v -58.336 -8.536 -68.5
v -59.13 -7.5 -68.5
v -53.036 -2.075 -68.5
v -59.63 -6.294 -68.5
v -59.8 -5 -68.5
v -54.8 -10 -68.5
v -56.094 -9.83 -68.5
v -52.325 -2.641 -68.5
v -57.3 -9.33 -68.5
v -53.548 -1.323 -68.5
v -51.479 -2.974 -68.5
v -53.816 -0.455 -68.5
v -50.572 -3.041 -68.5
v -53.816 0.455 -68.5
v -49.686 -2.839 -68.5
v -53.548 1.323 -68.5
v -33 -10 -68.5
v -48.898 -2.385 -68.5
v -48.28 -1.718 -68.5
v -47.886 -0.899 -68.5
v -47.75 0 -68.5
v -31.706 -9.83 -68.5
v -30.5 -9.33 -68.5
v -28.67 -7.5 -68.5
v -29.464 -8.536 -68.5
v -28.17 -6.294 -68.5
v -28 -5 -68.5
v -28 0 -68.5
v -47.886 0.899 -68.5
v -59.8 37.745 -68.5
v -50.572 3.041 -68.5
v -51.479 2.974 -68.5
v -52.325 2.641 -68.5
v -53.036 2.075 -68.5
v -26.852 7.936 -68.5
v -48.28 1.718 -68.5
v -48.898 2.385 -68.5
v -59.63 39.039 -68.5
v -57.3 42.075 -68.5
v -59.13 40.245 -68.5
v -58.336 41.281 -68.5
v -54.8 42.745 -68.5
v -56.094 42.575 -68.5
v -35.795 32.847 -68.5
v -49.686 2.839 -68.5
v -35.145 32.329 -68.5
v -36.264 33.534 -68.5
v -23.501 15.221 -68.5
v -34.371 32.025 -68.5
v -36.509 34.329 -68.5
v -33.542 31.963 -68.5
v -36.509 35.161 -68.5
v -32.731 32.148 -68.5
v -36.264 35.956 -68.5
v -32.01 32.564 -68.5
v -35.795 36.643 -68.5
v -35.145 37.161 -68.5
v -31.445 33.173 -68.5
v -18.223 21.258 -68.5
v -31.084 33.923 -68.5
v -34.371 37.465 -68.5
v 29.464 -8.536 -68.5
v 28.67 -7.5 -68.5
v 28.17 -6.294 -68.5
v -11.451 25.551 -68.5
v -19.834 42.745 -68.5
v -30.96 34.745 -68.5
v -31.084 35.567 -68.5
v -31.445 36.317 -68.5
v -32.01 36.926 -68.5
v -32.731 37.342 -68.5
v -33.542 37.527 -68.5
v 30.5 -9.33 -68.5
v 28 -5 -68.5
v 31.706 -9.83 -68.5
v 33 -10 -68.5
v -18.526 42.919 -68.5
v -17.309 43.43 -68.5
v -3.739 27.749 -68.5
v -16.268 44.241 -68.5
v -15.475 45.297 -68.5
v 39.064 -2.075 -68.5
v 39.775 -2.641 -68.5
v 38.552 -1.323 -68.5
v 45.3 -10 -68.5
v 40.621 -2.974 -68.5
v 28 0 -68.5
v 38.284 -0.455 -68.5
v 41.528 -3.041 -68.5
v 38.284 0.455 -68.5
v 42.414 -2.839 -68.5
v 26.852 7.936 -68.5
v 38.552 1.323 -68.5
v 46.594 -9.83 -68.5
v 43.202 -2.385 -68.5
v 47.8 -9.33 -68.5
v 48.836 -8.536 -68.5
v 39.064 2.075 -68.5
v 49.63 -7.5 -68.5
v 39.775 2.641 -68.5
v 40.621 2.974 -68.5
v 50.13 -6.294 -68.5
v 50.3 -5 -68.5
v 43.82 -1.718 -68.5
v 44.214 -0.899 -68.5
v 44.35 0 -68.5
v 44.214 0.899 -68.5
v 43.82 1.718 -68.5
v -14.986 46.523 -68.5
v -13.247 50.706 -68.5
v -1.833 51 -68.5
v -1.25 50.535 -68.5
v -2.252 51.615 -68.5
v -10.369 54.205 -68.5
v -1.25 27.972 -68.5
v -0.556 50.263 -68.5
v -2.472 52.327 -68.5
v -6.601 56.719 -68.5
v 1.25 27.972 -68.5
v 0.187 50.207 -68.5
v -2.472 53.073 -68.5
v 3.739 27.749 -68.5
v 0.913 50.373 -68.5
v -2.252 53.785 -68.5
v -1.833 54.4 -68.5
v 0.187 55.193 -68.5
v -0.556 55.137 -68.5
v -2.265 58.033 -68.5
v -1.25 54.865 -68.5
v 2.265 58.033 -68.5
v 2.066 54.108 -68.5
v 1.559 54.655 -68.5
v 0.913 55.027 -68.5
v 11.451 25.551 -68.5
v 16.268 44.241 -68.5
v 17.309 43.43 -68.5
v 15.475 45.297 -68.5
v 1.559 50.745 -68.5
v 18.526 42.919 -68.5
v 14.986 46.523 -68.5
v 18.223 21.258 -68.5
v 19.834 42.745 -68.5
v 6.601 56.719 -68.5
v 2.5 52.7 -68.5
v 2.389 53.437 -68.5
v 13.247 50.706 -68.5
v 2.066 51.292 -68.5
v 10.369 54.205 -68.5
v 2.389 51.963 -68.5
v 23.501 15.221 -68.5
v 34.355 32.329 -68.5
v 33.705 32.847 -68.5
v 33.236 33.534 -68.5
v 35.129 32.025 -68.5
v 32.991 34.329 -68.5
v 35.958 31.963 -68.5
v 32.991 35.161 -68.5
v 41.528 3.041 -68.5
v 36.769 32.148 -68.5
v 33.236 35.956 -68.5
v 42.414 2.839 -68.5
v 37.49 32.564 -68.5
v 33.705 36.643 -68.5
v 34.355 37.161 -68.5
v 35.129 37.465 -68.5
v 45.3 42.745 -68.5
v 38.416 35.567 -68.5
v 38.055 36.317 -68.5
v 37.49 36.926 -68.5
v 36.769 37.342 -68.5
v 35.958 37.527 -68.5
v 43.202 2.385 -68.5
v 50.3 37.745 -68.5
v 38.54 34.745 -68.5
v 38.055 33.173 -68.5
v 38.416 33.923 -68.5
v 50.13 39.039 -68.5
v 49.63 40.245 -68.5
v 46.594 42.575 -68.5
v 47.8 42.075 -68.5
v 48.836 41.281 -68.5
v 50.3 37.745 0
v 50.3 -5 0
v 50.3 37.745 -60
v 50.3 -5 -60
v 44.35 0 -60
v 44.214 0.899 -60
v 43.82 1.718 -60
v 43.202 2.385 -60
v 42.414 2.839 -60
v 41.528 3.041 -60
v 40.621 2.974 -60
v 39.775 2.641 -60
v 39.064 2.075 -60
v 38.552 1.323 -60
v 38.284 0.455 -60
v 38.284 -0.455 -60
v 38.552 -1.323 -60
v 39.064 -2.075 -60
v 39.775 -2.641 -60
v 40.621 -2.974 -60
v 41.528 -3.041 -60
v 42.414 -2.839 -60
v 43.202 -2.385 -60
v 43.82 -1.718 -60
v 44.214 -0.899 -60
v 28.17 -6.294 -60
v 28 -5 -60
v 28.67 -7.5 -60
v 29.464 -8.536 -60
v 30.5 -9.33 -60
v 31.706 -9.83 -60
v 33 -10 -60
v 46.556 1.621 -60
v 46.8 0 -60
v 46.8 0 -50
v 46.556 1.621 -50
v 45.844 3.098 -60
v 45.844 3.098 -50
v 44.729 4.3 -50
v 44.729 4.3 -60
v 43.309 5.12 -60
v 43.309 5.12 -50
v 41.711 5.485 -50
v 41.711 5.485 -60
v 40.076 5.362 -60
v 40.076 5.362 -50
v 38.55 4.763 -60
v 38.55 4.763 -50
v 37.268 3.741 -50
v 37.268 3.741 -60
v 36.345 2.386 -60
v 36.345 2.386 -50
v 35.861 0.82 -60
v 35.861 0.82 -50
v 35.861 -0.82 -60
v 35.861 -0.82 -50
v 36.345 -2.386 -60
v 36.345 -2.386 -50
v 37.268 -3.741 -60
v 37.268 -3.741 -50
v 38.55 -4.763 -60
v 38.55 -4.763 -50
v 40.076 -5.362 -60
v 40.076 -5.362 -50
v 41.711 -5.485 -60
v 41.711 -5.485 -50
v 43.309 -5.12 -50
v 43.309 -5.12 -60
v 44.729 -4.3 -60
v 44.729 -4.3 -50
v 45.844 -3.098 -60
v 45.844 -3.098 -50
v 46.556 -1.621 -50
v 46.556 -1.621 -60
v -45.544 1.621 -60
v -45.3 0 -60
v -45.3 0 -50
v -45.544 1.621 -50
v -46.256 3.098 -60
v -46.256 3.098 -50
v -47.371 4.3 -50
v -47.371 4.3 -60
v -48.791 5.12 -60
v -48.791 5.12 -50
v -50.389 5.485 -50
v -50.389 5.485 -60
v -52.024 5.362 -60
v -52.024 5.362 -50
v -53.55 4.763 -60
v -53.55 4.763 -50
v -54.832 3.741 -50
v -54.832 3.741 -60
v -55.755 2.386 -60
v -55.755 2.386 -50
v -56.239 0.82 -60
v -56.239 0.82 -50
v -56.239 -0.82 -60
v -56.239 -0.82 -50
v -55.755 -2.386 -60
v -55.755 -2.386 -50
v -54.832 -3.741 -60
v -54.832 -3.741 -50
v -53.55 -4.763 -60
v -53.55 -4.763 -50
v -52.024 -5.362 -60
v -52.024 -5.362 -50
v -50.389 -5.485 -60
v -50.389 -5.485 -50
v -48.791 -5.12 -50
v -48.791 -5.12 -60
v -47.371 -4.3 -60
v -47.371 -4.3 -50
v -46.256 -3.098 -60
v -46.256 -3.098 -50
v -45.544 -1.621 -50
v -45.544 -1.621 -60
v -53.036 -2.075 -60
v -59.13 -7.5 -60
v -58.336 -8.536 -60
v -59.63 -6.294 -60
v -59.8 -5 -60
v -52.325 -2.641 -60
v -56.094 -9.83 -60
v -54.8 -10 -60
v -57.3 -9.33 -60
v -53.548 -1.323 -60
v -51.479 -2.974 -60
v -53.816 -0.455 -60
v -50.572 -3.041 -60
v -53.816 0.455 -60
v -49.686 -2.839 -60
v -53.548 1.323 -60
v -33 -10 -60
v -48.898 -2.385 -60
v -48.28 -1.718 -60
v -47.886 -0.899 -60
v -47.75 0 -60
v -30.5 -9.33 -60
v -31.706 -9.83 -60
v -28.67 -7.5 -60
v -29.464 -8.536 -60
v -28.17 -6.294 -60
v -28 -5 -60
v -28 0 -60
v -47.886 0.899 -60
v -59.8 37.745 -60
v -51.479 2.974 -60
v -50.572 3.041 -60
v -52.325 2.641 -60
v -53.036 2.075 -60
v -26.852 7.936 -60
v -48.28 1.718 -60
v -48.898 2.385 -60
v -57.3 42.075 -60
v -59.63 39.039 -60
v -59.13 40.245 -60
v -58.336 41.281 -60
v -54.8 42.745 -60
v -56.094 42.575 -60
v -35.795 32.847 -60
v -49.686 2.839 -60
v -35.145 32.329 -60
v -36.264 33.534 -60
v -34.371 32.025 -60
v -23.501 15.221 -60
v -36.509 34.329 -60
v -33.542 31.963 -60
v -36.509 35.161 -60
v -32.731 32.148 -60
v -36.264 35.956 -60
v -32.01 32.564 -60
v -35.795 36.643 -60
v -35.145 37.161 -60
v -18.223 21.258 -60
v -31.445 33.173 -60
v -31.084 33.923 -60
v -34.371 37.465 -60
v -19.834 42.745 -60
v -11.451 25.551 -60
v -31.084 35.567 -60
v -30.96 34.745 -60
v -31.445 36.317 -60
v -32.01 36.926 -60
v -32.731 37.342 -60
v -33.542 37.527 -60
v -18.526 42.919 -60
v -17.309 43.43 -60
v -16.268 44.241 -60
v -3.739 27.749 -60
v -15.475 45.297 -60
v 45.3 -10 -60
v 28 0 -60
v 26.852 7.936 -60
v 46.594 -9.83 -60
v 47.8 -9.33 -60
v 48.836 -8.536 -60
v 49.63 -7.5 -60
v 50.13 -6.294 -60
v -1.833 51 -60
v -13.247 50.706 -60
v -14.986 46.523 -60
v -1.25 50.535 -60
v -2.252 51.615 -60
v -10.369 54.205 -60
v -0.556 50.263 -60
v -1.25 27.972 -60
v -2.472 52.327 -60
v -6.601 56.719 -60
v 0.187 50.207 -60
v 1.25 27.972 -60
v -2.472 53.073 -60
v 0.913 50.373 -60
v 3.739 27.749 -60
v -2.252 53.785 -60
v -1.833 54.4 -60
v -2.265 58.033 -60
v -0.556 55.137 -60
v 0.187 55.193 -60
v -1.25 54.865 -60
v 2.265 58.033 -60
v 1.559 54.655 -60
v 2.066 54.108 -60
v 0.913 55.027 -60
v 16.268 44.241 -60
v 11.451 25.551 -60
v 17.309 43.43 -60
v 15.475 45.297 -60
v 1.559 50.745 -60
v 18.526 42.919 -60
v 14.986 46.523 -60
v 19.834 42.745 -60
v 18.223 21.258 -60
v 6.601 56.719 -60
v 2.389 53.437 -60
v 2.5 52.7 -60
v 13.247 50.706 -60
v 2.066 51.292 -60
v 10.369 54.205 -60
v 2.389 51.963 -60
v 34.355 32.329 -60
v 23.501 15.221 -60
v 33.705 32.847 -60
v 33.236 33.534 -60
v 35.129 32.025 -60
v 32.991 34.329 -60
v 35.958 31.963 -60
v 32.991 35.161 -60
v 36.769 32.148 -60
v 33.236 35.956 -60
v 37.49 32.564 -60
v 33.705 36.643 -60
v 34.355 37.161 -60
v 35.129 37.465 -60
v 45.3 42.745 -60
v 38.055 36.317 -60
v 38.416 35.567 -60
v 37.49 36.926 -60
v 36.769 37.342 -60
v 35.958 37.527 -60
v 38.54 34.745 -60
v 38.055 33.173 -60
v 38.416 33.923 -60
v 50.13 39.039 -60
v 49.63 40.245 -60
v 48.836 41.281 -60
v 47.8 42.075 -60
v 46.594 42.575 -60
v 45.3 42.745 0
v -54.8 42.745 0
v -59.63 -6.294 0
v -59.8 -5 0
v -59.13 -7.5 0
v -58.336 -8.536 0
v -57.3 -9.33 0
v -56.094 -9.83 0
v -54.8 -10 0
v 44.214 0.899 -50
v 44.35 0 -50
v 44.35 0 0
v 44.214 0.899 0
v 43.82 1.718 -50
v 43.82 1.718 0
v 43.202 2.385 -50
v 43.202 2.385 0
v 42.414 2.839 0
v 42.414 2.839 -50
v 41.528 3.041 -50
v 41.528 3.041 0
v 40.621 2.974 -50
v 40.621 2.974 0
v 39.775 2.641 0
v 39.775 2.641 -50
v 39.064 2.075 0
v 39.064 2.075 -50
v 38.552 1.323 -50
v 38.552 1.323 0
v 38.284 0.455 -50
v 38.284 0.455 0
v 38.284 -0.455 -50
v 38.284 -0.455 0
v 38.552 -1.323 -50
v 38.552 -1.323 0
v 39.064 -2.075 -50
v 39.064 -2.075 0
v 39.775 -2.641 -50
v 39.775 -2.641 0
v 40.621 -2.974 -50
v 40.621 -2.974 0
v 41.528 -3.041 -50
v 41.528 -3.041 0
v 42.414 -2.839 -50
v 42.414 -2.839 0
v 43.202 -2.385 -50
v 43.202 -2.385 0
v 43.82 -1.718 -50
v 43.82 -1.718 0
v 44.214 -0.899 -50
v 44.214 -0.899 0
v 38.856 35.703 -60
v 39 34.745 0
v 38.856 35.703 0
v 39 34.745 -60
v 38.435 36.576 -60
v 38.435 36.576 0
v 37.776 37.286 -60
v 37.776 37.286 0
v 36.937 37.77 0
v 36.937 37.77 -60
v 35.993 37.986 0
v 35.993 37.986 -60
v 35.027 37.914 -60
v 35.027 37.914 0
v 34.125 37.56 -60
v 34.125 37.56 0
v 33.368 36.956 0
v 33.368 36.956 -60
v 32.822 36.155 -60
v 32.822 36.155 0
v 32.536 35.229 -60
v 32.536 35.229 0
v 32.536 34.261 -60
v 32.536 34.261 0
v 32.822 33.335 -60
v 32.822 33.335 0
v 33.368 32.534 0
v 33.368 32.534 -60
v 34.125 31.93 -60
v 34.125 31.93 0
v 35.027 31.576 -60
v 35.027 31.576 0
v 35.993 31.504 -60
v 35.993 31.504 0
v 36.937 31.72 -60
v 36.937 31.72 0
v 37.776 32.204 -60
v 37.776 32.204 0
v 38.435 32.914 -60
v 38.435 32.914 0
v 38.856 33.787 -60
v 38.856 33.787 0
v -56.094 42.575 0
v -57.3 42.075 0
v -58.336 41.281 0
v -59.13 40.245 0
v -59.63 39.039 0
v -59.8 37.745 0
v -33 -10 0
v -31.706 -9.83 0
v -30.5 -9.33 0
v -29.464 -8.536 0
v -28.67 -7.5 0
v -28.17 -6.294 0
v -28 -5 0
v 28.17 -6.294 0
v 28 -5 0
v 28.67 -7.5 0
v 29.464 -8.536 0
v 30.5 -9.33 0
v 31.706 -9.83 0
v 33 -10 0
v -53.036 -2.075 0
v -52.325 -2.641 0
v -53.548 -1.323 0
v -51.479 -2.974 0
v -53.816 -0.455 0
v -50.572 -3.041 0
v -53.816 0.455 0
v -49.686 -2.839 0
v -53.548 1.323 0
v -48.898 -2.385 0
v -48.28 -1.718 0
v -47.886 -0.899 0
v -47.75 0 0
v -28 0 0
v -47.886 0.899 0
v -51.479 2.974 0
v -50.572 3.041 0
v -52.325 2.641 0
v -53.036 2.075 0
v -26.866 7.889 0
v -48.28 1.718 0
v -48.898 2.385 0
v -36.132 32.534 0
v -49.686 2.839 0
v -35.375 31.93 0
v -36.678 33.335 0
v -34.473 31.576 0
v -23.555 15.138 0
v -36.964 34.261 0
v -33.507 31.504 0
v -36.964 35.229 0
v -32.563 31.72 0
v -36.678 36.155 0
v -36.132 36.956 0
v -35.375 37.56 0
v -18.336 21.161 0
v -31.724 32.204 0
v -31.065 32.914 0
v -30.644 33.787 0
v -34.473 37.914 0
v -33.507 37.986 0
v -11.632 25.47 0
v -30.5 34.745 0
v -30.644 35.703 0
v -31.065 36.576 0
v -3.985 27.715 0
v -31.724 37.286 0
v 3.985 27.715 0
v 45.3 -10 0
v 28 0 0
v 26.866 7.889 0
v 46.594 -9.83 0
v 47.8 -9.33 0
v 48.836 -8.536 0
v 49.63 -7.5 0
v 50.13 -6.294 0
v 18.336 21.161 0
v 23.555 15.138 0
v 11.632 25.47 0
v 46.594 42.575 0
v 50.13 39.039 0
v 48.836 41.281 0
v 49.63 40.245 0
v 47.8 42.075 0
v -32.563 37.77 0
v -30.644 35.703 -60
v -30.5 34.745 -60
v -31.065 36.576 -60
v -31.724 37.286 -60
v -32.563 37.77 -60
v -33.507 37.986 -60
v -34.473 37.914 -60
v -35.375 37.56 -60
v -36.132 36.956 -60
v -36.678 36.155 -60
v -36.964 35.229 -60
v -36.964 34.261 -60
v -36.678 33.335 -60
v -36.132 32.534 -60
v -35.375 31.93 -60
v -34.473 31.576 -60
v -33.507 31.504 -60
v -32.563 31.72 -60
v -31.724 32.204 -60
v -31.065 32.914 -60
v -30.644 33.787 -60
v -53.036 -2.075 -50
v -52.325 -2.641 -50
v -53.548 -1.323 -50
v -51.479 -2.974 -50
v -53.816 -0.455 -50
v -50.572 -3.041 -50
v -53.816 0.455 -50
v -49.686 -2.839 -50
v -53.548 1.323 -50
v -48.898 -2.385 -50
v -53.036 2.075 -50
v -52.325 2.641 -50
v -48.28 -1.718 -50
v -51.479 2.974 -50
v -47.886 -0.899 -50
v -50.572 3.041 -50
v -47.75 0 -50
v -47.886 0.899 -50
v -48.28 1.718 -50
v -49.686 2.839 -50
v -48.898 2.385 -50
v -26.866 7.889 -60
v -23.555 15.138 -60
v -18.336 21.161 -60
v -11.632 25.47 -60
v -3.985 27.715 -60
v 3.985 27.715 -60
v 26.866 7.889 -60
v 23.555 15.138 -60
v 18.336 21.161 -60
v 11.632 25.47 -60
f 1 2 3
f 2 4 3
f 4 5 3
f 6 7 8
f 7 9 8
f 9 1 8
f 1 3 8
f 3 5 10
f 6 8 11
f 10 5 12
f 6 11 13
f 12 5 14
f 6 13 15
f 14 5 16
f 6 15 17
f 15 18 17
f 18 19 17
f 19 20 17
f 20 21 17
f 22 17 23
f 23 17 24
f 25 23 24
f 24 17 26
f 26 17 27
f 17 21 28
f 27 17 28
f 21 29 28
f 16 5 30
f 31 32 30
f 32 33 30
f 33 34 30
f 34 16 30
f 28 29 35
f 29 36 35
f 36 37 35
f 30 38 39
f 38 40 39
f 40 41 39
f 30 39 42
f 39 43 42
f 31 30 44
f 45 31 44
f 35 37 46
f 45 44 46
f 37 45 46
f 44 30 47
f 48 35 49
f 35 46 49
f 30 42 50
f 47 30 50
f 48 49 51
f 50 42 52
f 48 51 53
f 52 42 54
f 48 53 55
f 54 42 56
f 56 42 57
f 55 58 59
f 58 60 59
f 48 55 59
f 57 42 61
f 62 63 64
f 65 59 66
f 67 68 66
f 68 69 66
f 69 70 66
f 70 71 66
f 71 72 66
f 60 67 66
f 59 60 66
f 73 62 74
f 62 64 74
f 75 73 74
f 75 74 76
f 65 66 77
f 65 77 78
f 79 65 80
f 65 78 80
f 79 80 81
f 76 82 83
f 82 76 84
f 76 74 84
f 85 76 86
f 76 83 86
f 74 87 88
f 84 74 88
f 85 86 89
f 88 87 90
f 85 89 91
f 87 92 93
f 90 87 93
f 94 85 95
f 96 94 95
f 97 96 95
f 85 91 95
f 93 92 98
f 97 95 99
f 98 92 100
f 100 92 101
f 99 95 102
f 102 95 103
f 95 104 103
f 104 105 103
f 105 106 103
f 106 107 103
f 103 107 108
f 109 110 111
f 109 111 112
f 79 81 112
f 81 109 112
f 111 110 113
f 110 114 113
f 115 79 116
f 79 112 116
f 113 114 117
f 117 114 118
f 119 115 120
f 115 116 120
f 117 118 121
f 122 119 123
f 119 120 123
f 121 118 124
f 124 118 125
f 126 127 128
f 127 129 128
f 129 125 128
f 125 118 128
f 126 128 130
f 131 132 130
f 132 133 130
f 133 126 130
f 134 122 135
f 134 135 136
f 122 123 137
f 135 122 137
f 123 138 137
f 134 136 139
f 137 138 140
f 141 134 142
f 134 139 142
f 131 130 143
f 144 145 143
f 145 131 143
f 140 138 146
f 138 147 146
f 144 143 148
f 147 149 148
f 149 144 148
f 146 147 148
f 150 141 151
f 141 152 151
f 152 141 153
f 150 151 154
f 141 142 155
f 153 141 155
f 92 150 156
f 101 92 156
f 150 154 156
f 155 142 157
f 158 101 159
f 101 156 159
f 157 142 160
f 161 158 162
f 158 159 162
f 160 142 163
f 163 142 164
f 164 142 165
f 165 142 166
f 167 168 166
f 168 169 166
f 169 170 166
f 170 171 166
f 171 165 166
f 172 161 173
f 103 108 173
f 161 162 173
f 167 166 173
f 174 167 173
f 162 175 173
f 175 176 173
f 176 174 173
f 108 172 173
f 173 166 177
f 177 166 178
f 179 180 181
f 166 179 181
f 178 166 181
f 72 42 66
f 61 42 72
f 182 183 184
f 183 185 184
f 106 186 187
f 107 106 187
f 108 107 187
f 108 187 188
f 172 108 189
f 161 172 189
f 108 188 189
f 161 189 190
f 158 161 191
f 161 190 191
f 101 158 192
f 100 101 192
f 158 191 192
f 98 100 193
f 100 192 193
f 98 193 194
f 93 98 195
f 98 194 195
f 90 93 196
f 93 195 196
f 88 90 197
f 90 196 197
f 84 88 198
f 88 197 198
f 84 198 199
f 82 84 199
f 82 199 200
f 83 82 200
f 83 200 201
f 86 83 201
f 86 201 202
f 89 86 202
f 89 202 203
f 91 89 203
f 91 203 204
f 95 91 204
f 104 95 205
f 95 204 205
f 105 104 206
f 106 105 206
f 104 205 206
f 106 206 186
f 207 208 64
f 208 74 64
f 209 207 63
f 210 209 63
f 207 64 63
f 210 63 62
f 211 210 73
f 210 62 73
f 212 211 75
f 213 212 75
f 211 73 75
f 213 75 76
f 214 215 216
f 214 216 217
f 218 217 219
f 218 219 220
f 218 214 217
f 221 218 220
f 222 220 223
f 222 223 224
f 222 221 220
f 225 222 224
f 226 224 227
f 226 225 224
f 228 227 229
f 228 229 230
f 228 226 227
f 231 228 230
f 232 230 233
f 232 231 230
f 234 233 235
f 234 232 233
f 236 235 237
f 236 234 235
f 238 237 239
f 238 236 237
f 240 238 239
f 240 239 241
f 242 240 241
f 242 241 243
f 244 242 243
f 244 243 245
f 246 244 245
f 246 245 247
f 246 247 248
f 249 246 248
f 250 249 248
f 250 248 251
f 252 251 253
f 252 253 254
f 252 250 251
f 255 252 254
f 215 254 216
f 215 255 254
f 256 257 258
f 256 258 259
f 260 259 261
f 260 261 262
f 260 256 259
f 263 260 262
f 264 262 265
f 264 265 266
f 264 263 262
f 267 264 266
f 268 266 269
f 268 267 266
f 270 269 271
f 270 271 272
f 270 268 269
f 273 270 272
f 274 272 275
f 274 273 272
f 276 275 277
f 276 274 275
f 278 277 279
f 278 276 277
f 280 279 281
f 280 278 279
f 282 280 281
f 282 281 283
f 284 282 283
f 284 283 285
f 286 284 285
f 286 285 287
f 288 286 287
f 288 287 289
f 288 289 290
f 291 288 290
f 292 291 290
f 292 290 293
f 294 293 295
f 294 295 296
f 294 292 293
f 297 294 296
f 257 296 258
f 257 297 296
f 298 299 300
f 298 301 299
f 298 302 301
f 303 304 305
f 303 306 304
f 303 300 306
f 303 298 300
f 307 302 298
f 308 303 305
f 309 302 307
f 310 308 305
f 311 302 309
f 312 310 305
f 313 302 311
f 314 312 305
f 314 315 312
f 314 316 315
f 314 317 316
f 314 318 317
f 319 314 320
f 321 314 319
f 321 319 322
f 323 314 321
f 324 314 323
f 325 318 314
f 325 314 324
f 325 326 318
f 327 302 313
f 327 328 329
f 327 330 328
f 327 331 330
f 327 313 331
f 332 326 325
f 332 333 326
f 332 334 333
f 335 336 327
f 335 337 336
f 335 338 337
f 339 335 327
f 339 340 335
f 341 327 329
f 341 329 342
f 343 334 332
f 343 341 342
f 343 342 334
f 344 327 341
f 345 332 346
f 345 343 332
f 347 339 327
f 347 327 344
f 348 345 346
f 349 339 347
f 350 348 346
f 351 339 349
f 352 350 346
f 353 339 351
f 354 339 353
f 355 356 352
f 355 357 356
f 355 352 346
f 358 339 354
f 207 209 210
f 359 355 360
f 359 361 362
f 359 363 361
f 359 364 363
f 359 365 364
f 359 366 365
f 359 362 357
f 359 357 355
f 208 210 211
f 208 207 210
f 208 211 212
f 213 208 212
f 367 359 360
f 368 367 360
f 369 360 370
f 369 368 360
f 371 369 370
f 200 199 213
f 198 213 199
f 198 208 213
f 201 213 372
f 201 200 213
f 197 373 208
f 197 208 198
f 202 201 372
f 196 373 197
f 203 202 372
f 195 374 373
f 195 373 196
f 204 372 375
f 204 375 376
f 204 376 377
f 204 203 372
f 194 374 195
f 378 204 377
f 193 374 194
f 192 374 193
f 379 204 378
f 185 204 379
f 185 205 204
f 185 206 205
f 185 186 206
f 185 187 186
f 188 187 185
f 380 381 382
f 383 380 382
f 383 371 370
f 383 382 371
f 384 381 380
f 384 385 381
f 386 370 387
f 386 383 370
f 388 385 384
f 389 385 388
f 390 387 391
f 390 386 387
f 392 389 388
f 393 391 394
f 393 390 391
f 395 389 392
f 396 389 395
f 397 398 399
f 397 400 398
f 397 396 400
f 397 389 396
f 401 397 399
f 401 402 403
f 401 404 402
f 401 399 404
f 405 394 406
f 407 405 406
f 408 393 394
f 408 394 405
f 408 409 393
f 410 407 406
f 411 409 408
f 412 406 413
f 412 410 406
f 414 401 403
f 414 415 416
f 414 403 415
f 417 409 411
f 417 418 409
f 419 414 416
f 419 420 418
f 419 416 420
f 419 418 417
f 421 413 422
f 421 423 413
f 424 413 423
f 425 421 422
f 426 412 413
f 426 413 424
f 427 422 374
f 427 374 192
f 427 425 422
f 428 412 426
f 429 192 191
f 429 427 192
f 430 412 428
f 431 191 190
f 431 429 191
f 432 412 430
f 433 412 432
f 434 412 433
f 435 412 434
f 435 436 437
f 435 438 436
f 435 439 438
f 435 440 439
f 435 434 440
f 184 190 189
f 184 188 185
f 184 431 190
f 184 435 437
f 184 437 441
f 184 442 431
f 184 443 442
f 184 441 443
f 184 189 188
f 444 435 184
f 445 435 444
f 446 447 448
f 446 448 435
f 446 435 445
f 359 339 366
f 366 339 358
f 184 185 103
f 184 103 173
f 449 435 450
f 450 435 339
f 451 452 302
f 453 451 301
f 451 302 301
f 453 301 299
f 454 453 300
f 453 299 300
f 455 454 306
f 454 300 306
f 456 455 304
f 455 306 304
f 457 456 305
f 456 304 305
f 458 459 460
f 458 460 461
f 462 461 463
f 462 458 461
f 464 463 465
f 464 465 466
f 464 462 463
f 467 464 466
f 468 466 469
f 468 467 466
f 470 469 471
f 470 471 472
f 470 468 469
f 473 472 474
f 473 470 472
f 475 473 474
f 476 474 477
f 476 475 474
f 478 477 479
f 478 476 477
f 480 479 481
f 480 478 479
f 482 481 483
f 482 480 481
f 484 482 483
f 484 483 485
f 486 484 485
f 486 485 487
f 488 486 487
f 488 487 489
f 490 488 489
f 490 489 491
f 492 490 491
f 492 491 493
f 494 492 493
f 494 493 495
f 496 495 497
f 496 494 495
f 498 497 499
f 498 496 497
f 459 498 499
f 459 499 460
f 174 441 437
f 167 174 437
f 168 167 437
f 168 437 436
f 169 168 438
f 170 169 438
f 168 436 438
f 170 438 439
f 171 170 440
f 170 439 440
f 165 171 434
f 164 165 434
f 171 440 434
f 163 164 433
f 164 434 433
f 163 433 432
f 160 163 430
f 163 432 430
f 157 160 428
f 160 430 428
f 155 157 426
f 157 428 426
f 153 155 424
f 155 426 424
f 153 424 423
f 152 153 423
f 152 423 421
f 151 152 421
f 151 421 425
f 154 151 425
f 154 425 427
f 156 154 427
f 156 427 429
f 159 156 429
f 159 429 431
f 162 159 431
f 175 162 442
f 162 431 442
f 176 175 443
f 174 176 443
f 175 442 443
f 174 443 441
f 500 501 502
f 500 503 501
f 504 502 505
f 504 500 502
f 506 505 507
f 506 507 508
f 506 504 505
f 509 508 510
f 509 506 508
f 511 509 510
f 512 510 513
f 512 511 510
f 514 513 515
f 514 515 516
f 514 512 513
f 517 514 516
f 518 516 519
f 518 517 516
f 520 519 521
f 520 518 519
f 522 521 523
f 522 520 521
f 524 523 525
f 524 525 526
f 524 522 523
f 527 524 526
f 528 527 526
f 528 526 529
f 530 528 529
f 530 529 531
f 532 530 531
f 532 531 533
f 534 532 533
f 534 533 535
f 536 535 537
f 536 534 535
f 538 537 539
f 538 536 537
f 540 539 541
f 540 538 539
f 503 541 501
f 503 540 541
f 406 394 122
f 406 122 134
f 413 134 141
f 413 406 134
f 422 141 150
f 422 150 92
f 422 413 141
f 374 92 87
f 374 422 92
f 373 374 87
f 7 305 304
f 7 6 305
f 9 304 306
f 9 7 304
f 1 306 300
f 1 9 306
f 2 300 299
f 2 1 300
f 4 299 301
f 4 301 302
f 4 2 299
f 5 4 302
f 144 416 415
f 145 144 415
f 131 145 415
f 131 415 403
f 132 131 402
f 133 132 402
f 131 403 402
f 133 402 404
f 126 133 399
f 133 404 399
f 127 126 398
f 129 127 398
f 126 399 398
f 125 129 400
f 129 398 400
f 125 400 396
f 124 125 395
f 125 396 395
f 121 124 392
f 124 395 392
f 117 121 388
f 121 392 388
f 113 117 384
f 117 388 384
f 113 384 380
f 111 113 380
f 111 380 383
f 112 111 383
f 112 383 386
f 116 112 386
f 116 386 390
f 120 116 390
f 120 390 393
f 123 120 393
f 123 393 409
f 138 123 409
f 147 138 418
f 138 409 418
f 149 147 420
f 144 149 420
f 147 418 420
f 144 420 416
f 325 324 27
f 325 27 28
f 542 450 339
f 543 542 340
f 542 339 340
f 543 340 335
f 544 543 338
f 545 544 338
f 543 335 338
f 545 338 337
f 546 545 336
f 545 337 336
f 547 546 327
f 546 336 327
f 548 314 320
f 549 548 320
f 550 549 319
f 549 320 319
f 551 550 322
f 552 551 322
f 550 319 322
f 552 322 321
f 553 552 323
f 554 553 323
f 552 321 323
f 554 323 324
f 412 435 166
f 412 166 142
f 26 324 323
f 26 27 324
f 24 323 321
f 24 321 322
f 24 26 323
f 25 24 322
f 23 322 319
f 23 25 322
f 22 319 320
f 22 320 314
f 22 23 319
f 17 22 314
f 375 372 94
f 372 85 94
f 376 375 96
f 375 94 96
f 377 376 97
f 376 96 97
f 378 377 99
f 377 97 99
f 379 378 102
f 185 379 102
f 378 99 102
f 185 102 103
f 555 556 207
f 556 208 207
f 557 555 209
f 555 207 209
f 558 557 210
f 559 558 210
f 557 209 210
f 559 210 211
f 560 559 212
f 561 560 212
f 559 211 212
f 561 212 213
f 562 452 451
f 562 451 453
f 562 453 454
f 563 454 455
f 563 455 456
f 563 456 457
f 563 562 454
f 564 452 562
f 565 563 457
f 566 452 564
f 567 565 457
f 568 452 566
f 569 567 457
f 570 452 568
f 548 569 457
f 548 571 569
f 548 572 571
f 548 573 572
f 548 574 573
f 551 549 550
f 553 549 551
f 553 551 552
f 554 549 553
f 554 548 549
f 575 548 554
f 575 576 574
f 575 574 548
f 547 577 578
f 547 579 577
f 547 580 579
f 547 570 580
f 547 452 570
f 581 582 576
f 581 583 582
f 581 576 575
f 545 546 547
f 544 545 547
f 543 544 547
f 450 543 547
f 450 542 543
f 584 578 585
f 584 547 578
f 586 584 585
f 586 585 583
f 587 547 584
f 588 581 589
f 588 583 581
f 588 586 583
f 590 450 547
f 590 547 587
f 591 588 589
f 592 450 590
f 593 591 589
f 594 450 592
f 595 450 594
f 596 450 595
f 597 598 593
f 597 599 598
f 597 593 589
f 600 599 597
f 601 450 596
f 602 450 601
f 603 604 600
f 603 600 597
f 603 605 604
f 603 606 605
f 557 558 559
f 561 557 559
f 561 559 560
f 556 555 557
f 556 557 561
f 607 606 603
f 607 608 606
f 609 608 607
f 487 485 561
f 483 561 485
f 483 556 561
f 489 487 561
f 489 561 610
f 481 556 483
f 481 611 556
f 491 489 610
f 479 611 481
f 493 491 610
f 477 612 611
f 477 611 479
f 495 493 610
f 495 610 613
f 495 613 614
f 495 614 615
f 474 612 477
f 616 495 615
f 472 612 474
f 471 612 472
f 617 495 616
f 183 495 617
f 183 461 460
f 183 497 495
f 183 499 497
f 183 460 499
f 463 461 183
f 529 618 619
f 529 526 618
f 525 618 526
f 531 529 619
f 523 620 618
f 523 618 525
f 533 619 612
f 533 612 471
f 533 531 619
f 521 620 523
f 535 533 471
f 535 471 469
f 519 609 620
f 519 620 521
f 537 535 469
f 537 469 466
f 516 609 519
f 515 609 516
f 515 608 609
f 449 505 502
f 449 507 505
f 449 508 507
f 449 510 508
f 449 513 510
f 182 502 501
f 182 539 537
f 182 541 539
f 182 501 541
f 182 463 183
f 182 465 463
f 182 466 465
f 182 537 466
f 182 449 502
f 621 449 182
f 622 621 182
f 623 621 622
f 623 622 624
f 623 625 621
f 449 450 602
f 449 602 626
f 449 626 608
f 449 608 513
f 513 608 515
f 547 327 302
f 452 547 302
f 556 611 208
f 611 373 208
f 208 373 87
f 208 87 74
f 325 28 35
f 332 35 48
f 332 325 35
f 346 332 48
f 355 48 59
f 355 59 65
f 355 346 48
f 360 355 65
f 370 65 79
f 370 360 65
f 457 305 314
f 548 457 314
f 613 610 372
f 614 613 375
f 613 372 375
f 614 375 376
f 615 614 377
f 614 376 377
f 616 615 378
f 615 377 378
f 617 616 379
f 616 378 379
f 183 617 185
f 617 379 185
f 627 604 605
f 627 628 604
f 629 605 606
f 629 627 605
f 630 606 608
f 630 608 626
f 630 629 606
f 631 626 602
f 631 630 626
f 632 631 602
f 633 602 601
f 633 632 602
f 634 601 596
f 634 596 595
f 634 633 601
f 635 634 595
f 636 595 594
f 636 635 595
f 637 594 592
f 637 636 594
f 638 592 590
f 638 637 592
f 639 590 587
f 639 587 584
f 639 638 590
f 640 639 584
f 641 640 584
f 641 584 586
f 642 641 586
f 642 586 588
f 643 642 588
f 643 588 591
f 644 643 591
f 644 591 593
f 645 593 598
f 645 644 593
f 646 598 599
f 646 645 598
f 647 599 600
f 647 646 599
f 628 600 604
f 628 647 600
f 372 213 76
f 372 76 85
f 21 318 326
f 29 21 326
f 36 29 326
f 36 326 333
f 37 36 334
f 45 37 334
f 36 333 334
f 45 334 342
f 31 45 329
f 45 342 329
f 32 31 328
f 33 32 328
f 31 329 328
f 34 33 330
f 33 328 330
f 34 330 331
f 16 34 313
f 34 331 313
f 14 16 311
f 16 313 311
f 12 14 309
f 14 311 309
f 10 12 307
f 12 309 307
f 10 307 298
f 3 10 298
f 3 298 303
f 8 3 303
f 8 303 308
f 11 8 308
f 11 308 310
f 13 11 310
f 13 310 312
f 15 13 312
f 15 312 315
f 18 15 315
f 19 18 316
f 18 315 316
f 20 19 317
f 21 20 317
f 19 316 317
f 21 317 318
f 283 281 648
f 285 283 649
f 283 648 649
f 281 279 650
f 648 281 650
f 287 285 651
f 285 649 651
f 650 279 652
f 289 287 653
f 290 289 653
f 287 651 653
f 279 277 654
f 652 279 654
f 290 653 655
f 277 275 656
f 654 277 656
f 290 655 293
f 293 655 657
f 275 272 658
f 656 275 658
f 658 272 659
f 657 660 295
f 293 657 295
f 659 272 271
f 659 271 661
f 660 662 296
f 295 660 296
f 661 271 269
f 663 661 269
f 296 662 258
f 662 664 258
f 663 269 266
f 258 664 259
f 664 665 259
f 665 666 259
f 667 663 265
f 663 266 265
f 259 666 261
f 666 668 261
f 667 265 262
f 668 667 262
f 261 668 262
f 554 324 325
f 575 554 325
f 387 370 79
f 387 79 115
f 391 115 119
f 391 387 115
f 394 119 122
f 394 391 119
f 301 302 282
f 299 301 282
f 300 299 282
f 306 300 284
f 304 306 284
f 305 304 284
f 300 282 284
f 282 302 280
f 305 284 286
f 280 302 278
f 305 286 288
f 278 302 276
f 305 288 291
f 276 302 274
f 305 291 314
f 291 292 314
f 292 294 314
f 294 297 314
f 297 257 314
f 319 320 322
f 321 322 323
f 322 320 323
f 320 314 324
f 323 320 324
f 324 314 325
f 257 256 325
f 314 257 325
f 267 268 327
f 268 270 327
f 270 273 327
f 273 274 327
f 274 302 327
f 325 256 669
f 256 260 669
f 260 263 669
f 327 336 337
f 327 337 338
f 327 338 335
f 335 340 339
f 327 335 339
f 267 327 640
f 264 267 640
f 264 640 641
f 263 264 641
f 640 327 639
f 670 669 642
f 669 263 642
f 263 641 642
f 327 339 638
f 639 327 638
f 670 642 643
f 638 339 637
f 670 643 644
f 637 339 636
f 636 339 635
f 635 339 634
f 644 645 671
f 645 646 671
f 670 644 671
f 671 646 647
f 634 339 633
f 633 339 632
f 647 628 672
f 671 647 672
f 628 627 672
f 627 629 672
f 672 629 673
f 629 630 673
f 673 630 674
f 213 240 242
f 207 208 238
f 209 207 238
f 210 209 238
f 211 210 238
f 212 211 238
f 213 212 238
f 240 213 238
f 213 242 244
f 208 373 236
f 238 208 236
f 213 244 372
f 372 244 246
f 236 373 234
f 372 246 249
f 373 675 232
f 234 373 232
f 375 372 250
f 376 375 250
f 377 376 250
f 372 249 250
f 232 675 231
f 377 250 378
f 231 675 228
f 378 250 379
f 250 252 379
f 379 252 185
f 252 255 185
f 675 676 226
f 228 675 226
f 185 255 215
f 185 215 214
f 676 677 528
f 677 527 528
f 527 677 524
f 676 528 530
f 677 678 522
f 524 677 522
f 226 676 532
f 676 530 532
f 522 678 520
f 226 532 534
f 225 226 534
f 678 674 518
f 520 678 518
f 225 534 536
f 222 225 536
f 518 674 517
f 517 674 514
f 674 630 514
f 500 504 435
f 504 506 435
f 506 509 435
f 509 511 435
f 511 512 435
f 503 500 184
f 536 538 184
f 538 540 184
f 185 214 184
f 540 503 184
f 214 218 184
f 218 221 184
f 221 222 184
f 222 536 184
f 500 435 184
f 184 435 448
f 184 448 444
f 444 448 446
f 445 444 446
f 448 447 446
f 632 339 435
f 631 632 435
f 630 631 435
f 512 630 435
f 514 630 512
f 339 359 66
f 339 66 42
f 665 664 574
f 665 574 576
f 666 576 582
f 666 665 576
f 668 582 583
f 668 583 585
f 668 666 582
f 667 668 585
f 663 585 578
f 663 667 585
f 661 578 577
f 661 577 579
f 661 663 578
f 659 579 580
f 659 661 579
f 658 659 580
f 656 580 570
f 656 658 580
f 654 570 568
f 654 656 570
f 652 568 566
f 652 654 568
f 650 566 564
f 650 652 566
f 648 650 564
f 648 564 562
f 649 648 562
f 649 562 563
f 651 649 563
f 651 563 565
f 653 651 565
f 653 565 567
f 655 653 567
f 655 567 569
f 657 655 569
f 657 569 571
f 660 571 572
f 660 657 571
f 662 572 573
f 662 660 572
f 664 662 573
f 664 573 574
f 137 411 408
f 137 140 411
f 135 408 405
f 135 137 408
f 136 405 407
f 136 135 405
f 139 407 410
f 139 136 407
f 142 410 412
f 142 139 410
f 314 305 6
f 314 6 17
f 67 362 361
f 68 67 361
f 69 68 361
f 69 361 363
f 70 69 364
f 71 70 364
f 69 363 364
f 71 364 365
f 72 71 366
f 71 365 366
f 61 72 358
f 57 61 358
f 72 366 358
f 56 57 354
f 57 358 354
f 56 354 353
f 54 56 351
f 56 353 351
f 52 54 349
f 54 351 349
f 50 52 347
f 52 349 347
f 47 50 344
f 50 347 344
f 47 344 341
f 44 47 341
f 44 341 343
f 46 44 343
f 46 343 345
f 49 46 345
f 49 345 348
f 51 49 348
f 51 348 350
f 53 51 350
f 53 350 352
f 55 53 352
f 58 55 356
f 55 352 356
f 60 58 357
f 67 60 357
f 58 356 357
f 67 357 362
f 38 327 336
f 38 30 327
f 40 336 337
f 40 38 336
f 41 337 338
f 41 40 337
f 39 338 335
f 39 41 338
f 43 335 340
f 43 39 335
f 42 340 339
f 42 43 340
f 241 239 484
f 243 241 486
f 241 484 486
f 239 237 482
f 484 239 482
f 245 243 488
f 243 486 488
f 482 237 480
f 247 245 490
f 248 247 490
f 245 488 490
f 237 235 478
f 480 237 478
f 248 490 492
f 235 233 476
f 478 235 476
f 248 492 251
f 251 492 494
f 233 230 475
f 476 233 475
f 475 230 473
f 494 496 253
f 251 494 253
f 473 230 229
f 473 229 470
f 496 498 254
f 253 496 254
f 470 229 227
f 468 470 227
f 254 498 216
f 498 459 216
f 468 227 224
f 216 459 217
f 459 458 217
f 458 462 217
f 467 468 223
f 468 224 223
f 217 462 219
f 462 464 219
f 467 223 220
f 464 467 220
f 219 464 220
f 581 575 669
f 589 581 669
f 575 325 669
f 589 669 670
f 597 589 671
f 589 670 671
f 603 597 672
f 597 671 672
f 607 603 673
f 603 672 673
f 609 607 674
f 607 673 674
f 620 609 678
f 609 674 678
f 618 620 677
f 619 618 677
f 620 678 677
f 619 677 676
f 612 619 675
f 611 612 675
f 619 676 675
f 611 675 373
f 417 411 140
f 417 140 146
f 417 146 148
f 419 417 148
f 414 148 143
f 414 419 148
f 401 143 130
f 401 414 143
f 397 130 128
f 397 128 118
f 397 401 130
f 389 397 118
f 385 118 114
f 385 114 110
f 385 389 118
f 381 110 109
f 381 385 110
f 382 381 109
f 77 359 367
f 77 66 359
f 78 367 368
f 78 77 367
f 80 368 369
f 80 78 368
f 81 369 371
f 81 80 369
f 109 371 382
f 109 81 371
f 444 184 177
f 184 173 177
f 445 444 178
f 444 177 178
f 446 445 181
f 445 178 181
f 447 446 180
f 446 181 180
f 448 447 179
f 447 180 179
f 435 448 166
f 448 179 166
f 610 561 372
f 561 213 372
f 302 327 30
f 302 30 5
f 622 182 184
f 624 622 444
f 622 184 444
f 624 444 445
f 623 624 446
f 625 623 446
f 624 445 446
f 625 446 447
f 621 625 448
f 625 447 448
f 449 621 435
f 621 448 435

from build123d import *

# Parameters (mm, degrees)
F2_R     = 5.5
F2_R_2   = 3.25
F2_R_3   = 2.5
F2_R_4   = 3.05
F2_R_5   = 2.79
F3_DEPTH = 8.5
F4_R     = 5
F5_R     = 5.5
F5_R_2   = 3.25
F6_DEPTH = 10
F7_R     = 5.5
F7_R_2   = 3.25
F7_R_3   = 3.05
F8_DEPTH = 50


# Not quite as in the source:
# - a feature names something its author has since deleted; it is built from what else it names


with BuildPart() as f3:
    # F2 (on offset) → F3 (new body)
    with BuildSketch(Plane.XY.offset(-60)):
        with BuildLine():
            ThreePointArc((-3.739333985, 27.7491870394), (-12.178842961, 33.2301269514), (-15.455, 42.745))
            Line((-15.455, 42.745), (-59.8, 42.745))
            Line((-59.8, 42.745), (-59.8, -10))
            Line((-59.8, -10), (-28, -10))
            Line((-28, -10), (-28, 0))
            ThreePointArc((-28, 0), (-21.0796270316, 18.429577429), (-3.739333985, 27.7491870394))
        make_face()
        with Locations((-50.8, 0)):
            Circle(F2_R, mode=Mode.SUBTRACT)
        with Locations((-33.75, 34.745)):
            Circle(F2_R_2, mode=Mode.SUBTRACT)
        with BuildLine():
            Line((50.3, 42.745), (15.455, 42.745))
            ThreePointArc((15.455, 42.745), (12.178842961, 33.2301269514), (3.739333985, 27.7491870394))
            ThreePointArc((3.739333985, 27.7491870394), (21.0796270316, 18.429577429), (28, 0))
            Line((28, 0), (28, -10))
            Line((28, -10), (50.3, -10))
            Line((50.3, -10), (50.3, 42.745))
        make_face()
        with Locations((41.3, 0)):
            Circle(F2_R, mode=Mode.SUBTRACT)
        with Locations((35.75, 34.745)):
            Circle(F2_R_2, mode=Mode.SUBTRACT)
        with BuildLine():
            Line((-15.455, 42.745), (15.455, 42.745))
            ThreePointArc((15.455, 42.745), (0, 58.2), (-15.455, 42.745))
        make_face()
        with Locations((0, 52.7)):
            Circle(F2_R_3, mode=Mode.SUBTRACT)
        with BuildLine():
            ThreePointArc((3.739333985, 27.7491870394), (12.178842961, 33.2301269514), (15.455, 42.745))
            Line((15.455, 42.745), (-15.455, 42.745))
            ThreePointArc((-15.455, 42.745), (-12.178842961, 33.2301269514), (-3.739333985, 27.7491870394))
            ThreePointArc((-3.739333985, 27.7491870394), (0, 28), (3.739333985, 27.7491870394))
        make_face()
        with Locations((-50.8, 0)):
            Circle(F2_R)
        with Locations((-50.8, 0)):
            Circle(F2_R_4, mode=Mode.SUBTRACT)
        with Locations((41.3, 0)):
            Circle(F2_R)
        with Locations((41.3, 0)):
            Circle(F2_R_4, mode=Mode.SUBTRACT)
        with Locations((-33.75, 34.745)):
            Circle(F2_R_2)
        with Locations((-33.75, 34.745)):
            Circle(F2_R_5, mode=Mode.SUBTRACT)
        with Locations((35.75, 34.745)):
            Circle(F2_R_2)
        with Locations((35.75, 34.745)):
            Circle(F2_R_5, mode=Mode.SUBTRACT)
    extrude(amount=-F3_DEPTH)

    # F4
    f4_edges = [f3.edges().sort_by_distance(p)[0] for p in [
        (-28, -10, -64.25),
        (28, -10, -64.25),
        (-15.455, 42.745, -64.25),
        (-59.8, 42.745, -64.25),
        (-59.8, -10, -64.25),
        (50.3, -10, -64.25),
        (50.3, 42.745, -64.25),
        (15.455, 42.745, -64.25),
    ]]
    fillet(f4_edges, radius=F4_R)


with BuildPart() as f6:
    # F5 (on face) → F6 (new body)
    with BuildSketch(Plane.XY.offset(-60)):
        with BuildLine():
            ThreePointArc((-28, 0), (0, 28), (28, 0))
            Line((28, 0), (28, -5))
            ThreePointArc((28, -5), (29.4644660941, -8.5355339059), (33, -10))
            Line((33, -10), (45.3, -10))
            ThreePointArc((45.3, -10), (48.8355339059, -8.5355339059), (50.3, -5))
            Line((50.3, -5), (50.3, 37.745))
            ThreePointArc((50.3, 37.745), (48.8355339059, 41.2805339059), (45.3, 42.745))
            Line((45.3, 42.745), (29.041634566, 42.745))
            Line((29.041634566, 42.745), (19.8344907926, 42.745))
            Line((19.8344907926, 42.745), (-19.8344907926, 42.745))
            Line((-19.8344907926, 42.745), (-25.041634566, 42.745))
            Line((-25.041634566, 42.745), (-54.8, 42.745))
            ThreePointArc((-54.8, 42.745), (-58.3355339059, 41.2805339059), (-59.8, 37.745))
            Line((-59.8, 37.745), (-59.8, -5))
            ThreePointArc((-59.8, -5), (-58.3355339059, -8.5355339059), (-54.8, -10))
            Line((-54.8, -10), (-33, -10))
            ThreePointArc((-33, -10), (-29.4644660941, -8.5355339059), (-28, -5))
            Line((-28, -5), (-28, 0))
        make_face()
        with Locations((-50.8, 0)):
            Circle(F5_R, mode=Mode.SUBTRACT)
        with Locations((41.3, 0)):
            Circle(F5_R, mode=Mode.SUBTRACT)
        with Locations((-33.75, 34.745)):
            Circle(F5_R_2, mode=Mode.SUBTRACT)
        with Locations((35.75, 34.745)):
            Circle(F5_R_2, mode=Mode.SUBTRACT)
    extrude(amount=F6_DEPTH)

    # F7 (on face) → F8 (join)
    with BuildSketch(Plane.XY.offset(-50)):
        with BuildLine():
            Line((-28, -5), (-28, 0))
            ThreePointArc((-28, 0), (0, 28), (28, 0))
            Line((28, 0), (28, -5))
            ThreePointArc((28, -5), (29.4644660941, -8.5355339059), (33, -10))
            Line((33, -10), (45.3, -10))
            ThreePointArc((45.3, -10), (48.8355339059, -8.5355339059), (50.3, -5))
            Line((50.3, -5), (50.3, 37.745))
            ThreePointArc((50.3, 37.745), (48.8355339059, 41.2805339059), (45.3, 42.745))
            Line((45.3, 42.745), (-54.8, 42.745))
            ThreePointArc((-54.8, 42.745), (-58.3355339059, 41.2805339059), (-59.8, 37.745))
            Line((-59.8, 37.745), (-59.8, -5))
            ThreePointArc((-59.8, -5), (-58.3355339059, -8.5355339059), (-54.8, -10))
            Line((-54.8, -10), (-33, -10))
            ThreePointArc((-33, -10), (-29.4644660941, -8.5355339059), (-28, -5))
        make_face()
        with Locations((-50.8, 0)):
            Circle(F7_R, mode=Mode.SUBTRACT)
        with Locations((41.3, 0)):
            Circle(F7_R, mode=Mode.SUBTRACT)
        with Locations((-33.75, 34.745)):
            Circle(F7_R_2, mode=Mode.SUBTRACT)
        with Locations((35.75, 34.745)):
            Circle(F7_R_2, mode=Mode.SUBTRACT)
        with Locations((-50.8, 0)):
            Circle(F7_R)
        with Locations((-50.8, 0)):
            Circle(F7_R_3, mode=Mode.SUBTRACT)
        with Locations((41.3, 0)):
            Circle(F7_R)
        with Locations((41.3, 0)):
            Circle(F7_R_3, mode=Mode.SUBTRACT)
    extrude(amount=F8_DEPTH)


solid = Compound([f3.part, f6.part])
